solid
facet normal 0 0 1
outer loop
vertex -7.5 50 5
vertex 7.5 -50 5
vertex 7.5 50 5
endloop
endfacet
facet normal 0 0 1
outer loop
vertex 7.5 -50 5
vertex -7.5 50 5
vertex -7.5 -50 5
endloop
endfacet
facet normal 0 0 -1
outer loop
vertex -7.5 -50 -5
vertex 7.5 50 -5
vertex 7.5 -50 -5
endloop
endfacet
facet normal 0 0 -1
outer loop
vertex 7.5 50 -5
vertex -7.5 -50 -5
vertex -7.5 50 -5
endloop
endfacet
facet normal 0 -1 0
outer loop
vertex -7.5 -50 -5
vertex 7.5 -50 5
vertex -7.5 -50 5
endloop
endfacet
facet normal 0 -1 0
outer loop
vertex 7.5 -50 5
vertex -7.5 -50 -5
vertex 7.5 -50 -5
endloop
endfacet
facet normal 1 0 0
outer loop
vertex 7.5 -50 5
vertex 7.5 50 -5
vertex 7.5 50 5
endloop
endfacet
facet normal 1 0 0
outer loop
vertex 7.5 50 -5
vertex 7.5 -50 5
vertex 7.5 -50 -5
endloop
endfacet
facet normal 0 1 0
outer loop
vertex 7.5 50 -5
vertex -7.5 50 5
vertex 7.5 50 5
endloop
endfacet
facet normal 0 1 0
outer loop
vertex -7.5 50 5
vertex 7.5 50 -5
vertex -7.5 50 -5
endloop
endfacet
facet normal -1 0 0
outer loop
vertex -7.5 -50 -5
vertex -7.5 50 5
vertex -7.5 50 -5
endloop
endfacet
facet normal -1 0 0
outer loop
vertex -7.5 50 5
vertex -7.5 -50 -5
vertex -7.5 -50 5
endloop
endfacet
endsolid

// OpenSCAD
// Parameters
rail_L = 100.0; //[50.0:200.0:1]
rail_W = 15.0; //[7.5:30.0:0.5]
rail_H = 10.0; //[5.0:20.0:0.5]

// Geometry
module rail_body() {
  color("Silver") // Aluminum-like appearance
  translate([0, 0, 0])
    cube([rail_W, rail_L, rail_H], center=true);
}

// Final Output
union() {
  rail_body();
}
